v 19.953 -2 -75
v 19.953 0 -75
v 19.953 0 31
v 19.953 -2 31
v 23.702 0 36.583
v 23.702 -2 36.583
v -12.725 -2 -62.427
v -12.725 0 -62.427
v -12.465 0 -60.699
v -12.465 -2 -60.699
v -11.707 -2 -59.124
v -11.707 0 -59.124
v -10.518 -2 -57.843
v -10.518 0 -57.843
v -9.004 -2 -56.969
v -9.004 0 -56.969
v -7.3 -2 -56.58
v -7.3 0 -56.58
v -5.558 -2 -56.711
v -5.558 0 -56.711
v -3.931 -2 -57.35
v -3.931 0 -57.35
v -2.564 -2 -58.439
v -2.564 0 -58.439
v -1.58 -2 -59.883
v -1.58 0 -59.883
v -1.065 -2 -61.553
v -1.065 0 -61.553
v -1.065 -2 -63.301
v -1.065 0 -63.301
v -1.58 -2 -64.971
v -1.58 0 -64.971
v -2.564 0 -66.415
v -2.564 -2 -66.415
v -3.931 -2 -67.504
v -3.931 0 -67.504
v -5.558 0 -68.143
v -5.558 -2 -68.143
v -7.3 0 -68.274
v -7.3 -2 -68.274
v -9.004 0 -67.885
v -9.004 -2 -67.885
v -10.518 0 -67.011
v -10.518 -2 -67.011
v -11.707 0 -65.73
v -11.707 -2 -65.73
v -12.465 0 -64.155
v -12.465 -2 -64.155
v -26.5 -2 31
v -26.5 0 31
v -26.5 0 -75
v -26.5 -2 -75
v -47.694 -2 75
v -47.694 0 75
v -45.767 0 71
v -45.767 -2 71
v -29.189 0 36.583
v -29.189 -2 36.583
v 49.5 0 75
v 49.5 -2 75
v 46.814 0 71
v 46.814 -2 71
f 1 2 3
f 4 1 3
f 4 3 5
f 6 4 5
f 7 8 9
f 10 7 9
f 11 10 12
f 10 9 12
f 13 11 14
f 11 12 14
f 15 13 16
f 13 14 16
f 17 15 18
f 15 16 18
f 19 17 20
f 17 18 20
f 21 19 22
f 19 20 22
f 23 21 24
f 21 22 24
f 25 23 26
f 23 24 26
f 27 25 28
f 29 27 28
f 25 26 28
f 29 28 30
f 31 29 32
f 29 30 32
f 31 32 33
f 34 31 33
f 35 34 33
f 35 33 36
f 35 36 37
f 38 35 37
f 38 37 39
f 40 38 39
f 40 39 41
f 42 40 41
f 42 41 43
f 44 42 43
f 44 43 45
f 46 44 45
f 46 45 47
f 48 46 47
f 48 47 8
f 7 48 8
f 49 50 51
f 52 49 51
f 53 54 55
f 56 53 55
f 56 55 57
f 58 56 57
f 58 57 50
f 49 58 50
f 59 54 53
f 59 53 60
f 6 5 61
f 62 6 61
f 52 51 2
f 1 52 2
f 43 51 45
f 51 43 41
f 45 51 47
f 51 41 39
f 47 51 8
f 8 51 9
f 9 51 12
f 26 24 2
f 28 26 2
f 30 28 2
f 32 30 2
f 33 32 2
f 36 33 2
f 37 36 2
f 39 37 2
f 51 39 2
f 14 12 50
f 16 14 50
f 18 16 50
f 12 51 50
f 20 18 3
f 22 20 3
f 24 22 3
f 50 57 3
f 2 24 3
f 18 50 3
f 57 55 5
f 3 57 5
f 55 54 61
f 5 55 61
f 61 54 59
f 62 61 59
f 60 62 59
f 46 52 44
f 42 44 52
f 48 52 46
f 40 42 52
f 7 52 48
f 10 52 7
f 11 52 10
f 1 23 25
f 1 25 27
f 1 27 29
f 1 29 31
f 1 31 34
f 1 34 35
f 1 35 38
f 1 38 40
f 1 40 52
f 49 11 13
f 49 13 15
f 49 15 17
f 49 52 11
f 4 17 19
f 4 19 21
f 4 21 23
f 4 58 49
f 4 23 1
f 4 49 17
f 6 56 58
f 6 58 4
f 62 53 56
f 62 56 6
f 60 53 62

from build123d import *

# Parameters (mm, degrees)
F0_W       = 99
F0_H       = 150
F1_DEPTH   = 1
F1_FACE1_W = 99
F1_FACE1_H = 150
F2_R       = 5.8629456908
F3_DEPTH   = 1
F4_DEPTH   = 25
F6_DEPTH   = 25


with BuildPart() as f1:
    # F0 (on Front) → F1 (new body)
    with BuildSketch(Plane.XZ):
        Rectangle(F0_W, F0_H)
    extrude(amount=F1_DEPTH)

    # F1_face1 (on face) + F2 (on face) → F3 (join)
    with BuildSketch(Plane.XZ.offset(1)):
        Rectangle(F1_FACE1_W, F1_FACE1_H)
    with BuildSketch(Plane(origin=(0, 0, 0), x_dir=(-1, 0, 0), z_dir=(0, 1, 0))):
        with Locations((6.8623106927, -62.4270327389)):
            Circle(F2_R)
    extrude(amount=F3_DEPTH, dir=(0, -1, 0))

    # F2 (on face) → F4 (cut)
    with BuildSketch(Plane(origin=(0, 0, 0), x_dir=(-1, 0, 0), z_dir=(0, 1, 0))):
        with Locations((6.8623106927, -62.4270327389)):
            Circle(F2_R)
    extrude(amount=-F4_DEPTH, mode=Mode.SUBTRACT)

    # F5 (on face) → F6 (cut)
    with BuildSketch(Plane(origin=(0, 0, 0), x_dir=(-1, 0, 0), z_dir=(0, 1, 0))):
        Polygon((-49.5, -75), (-19.9534265946, -75), (-19.9534265946, 31), (-23.702466874, 36.5829747168), (-46.8139478722, 71), (-49.5, 75), align=None)
        Polygon((26.5, 31), (26.5, -75), (49.5, -75), (49.5, 75), (47.6940077596, 75), (45.7672797814, 71), (29.1892183971, 36.5829747168), align=None)
    extrude(amount=-F6_DEPTH, mode=Mode.SUBTRACT)


solid = f1.part
